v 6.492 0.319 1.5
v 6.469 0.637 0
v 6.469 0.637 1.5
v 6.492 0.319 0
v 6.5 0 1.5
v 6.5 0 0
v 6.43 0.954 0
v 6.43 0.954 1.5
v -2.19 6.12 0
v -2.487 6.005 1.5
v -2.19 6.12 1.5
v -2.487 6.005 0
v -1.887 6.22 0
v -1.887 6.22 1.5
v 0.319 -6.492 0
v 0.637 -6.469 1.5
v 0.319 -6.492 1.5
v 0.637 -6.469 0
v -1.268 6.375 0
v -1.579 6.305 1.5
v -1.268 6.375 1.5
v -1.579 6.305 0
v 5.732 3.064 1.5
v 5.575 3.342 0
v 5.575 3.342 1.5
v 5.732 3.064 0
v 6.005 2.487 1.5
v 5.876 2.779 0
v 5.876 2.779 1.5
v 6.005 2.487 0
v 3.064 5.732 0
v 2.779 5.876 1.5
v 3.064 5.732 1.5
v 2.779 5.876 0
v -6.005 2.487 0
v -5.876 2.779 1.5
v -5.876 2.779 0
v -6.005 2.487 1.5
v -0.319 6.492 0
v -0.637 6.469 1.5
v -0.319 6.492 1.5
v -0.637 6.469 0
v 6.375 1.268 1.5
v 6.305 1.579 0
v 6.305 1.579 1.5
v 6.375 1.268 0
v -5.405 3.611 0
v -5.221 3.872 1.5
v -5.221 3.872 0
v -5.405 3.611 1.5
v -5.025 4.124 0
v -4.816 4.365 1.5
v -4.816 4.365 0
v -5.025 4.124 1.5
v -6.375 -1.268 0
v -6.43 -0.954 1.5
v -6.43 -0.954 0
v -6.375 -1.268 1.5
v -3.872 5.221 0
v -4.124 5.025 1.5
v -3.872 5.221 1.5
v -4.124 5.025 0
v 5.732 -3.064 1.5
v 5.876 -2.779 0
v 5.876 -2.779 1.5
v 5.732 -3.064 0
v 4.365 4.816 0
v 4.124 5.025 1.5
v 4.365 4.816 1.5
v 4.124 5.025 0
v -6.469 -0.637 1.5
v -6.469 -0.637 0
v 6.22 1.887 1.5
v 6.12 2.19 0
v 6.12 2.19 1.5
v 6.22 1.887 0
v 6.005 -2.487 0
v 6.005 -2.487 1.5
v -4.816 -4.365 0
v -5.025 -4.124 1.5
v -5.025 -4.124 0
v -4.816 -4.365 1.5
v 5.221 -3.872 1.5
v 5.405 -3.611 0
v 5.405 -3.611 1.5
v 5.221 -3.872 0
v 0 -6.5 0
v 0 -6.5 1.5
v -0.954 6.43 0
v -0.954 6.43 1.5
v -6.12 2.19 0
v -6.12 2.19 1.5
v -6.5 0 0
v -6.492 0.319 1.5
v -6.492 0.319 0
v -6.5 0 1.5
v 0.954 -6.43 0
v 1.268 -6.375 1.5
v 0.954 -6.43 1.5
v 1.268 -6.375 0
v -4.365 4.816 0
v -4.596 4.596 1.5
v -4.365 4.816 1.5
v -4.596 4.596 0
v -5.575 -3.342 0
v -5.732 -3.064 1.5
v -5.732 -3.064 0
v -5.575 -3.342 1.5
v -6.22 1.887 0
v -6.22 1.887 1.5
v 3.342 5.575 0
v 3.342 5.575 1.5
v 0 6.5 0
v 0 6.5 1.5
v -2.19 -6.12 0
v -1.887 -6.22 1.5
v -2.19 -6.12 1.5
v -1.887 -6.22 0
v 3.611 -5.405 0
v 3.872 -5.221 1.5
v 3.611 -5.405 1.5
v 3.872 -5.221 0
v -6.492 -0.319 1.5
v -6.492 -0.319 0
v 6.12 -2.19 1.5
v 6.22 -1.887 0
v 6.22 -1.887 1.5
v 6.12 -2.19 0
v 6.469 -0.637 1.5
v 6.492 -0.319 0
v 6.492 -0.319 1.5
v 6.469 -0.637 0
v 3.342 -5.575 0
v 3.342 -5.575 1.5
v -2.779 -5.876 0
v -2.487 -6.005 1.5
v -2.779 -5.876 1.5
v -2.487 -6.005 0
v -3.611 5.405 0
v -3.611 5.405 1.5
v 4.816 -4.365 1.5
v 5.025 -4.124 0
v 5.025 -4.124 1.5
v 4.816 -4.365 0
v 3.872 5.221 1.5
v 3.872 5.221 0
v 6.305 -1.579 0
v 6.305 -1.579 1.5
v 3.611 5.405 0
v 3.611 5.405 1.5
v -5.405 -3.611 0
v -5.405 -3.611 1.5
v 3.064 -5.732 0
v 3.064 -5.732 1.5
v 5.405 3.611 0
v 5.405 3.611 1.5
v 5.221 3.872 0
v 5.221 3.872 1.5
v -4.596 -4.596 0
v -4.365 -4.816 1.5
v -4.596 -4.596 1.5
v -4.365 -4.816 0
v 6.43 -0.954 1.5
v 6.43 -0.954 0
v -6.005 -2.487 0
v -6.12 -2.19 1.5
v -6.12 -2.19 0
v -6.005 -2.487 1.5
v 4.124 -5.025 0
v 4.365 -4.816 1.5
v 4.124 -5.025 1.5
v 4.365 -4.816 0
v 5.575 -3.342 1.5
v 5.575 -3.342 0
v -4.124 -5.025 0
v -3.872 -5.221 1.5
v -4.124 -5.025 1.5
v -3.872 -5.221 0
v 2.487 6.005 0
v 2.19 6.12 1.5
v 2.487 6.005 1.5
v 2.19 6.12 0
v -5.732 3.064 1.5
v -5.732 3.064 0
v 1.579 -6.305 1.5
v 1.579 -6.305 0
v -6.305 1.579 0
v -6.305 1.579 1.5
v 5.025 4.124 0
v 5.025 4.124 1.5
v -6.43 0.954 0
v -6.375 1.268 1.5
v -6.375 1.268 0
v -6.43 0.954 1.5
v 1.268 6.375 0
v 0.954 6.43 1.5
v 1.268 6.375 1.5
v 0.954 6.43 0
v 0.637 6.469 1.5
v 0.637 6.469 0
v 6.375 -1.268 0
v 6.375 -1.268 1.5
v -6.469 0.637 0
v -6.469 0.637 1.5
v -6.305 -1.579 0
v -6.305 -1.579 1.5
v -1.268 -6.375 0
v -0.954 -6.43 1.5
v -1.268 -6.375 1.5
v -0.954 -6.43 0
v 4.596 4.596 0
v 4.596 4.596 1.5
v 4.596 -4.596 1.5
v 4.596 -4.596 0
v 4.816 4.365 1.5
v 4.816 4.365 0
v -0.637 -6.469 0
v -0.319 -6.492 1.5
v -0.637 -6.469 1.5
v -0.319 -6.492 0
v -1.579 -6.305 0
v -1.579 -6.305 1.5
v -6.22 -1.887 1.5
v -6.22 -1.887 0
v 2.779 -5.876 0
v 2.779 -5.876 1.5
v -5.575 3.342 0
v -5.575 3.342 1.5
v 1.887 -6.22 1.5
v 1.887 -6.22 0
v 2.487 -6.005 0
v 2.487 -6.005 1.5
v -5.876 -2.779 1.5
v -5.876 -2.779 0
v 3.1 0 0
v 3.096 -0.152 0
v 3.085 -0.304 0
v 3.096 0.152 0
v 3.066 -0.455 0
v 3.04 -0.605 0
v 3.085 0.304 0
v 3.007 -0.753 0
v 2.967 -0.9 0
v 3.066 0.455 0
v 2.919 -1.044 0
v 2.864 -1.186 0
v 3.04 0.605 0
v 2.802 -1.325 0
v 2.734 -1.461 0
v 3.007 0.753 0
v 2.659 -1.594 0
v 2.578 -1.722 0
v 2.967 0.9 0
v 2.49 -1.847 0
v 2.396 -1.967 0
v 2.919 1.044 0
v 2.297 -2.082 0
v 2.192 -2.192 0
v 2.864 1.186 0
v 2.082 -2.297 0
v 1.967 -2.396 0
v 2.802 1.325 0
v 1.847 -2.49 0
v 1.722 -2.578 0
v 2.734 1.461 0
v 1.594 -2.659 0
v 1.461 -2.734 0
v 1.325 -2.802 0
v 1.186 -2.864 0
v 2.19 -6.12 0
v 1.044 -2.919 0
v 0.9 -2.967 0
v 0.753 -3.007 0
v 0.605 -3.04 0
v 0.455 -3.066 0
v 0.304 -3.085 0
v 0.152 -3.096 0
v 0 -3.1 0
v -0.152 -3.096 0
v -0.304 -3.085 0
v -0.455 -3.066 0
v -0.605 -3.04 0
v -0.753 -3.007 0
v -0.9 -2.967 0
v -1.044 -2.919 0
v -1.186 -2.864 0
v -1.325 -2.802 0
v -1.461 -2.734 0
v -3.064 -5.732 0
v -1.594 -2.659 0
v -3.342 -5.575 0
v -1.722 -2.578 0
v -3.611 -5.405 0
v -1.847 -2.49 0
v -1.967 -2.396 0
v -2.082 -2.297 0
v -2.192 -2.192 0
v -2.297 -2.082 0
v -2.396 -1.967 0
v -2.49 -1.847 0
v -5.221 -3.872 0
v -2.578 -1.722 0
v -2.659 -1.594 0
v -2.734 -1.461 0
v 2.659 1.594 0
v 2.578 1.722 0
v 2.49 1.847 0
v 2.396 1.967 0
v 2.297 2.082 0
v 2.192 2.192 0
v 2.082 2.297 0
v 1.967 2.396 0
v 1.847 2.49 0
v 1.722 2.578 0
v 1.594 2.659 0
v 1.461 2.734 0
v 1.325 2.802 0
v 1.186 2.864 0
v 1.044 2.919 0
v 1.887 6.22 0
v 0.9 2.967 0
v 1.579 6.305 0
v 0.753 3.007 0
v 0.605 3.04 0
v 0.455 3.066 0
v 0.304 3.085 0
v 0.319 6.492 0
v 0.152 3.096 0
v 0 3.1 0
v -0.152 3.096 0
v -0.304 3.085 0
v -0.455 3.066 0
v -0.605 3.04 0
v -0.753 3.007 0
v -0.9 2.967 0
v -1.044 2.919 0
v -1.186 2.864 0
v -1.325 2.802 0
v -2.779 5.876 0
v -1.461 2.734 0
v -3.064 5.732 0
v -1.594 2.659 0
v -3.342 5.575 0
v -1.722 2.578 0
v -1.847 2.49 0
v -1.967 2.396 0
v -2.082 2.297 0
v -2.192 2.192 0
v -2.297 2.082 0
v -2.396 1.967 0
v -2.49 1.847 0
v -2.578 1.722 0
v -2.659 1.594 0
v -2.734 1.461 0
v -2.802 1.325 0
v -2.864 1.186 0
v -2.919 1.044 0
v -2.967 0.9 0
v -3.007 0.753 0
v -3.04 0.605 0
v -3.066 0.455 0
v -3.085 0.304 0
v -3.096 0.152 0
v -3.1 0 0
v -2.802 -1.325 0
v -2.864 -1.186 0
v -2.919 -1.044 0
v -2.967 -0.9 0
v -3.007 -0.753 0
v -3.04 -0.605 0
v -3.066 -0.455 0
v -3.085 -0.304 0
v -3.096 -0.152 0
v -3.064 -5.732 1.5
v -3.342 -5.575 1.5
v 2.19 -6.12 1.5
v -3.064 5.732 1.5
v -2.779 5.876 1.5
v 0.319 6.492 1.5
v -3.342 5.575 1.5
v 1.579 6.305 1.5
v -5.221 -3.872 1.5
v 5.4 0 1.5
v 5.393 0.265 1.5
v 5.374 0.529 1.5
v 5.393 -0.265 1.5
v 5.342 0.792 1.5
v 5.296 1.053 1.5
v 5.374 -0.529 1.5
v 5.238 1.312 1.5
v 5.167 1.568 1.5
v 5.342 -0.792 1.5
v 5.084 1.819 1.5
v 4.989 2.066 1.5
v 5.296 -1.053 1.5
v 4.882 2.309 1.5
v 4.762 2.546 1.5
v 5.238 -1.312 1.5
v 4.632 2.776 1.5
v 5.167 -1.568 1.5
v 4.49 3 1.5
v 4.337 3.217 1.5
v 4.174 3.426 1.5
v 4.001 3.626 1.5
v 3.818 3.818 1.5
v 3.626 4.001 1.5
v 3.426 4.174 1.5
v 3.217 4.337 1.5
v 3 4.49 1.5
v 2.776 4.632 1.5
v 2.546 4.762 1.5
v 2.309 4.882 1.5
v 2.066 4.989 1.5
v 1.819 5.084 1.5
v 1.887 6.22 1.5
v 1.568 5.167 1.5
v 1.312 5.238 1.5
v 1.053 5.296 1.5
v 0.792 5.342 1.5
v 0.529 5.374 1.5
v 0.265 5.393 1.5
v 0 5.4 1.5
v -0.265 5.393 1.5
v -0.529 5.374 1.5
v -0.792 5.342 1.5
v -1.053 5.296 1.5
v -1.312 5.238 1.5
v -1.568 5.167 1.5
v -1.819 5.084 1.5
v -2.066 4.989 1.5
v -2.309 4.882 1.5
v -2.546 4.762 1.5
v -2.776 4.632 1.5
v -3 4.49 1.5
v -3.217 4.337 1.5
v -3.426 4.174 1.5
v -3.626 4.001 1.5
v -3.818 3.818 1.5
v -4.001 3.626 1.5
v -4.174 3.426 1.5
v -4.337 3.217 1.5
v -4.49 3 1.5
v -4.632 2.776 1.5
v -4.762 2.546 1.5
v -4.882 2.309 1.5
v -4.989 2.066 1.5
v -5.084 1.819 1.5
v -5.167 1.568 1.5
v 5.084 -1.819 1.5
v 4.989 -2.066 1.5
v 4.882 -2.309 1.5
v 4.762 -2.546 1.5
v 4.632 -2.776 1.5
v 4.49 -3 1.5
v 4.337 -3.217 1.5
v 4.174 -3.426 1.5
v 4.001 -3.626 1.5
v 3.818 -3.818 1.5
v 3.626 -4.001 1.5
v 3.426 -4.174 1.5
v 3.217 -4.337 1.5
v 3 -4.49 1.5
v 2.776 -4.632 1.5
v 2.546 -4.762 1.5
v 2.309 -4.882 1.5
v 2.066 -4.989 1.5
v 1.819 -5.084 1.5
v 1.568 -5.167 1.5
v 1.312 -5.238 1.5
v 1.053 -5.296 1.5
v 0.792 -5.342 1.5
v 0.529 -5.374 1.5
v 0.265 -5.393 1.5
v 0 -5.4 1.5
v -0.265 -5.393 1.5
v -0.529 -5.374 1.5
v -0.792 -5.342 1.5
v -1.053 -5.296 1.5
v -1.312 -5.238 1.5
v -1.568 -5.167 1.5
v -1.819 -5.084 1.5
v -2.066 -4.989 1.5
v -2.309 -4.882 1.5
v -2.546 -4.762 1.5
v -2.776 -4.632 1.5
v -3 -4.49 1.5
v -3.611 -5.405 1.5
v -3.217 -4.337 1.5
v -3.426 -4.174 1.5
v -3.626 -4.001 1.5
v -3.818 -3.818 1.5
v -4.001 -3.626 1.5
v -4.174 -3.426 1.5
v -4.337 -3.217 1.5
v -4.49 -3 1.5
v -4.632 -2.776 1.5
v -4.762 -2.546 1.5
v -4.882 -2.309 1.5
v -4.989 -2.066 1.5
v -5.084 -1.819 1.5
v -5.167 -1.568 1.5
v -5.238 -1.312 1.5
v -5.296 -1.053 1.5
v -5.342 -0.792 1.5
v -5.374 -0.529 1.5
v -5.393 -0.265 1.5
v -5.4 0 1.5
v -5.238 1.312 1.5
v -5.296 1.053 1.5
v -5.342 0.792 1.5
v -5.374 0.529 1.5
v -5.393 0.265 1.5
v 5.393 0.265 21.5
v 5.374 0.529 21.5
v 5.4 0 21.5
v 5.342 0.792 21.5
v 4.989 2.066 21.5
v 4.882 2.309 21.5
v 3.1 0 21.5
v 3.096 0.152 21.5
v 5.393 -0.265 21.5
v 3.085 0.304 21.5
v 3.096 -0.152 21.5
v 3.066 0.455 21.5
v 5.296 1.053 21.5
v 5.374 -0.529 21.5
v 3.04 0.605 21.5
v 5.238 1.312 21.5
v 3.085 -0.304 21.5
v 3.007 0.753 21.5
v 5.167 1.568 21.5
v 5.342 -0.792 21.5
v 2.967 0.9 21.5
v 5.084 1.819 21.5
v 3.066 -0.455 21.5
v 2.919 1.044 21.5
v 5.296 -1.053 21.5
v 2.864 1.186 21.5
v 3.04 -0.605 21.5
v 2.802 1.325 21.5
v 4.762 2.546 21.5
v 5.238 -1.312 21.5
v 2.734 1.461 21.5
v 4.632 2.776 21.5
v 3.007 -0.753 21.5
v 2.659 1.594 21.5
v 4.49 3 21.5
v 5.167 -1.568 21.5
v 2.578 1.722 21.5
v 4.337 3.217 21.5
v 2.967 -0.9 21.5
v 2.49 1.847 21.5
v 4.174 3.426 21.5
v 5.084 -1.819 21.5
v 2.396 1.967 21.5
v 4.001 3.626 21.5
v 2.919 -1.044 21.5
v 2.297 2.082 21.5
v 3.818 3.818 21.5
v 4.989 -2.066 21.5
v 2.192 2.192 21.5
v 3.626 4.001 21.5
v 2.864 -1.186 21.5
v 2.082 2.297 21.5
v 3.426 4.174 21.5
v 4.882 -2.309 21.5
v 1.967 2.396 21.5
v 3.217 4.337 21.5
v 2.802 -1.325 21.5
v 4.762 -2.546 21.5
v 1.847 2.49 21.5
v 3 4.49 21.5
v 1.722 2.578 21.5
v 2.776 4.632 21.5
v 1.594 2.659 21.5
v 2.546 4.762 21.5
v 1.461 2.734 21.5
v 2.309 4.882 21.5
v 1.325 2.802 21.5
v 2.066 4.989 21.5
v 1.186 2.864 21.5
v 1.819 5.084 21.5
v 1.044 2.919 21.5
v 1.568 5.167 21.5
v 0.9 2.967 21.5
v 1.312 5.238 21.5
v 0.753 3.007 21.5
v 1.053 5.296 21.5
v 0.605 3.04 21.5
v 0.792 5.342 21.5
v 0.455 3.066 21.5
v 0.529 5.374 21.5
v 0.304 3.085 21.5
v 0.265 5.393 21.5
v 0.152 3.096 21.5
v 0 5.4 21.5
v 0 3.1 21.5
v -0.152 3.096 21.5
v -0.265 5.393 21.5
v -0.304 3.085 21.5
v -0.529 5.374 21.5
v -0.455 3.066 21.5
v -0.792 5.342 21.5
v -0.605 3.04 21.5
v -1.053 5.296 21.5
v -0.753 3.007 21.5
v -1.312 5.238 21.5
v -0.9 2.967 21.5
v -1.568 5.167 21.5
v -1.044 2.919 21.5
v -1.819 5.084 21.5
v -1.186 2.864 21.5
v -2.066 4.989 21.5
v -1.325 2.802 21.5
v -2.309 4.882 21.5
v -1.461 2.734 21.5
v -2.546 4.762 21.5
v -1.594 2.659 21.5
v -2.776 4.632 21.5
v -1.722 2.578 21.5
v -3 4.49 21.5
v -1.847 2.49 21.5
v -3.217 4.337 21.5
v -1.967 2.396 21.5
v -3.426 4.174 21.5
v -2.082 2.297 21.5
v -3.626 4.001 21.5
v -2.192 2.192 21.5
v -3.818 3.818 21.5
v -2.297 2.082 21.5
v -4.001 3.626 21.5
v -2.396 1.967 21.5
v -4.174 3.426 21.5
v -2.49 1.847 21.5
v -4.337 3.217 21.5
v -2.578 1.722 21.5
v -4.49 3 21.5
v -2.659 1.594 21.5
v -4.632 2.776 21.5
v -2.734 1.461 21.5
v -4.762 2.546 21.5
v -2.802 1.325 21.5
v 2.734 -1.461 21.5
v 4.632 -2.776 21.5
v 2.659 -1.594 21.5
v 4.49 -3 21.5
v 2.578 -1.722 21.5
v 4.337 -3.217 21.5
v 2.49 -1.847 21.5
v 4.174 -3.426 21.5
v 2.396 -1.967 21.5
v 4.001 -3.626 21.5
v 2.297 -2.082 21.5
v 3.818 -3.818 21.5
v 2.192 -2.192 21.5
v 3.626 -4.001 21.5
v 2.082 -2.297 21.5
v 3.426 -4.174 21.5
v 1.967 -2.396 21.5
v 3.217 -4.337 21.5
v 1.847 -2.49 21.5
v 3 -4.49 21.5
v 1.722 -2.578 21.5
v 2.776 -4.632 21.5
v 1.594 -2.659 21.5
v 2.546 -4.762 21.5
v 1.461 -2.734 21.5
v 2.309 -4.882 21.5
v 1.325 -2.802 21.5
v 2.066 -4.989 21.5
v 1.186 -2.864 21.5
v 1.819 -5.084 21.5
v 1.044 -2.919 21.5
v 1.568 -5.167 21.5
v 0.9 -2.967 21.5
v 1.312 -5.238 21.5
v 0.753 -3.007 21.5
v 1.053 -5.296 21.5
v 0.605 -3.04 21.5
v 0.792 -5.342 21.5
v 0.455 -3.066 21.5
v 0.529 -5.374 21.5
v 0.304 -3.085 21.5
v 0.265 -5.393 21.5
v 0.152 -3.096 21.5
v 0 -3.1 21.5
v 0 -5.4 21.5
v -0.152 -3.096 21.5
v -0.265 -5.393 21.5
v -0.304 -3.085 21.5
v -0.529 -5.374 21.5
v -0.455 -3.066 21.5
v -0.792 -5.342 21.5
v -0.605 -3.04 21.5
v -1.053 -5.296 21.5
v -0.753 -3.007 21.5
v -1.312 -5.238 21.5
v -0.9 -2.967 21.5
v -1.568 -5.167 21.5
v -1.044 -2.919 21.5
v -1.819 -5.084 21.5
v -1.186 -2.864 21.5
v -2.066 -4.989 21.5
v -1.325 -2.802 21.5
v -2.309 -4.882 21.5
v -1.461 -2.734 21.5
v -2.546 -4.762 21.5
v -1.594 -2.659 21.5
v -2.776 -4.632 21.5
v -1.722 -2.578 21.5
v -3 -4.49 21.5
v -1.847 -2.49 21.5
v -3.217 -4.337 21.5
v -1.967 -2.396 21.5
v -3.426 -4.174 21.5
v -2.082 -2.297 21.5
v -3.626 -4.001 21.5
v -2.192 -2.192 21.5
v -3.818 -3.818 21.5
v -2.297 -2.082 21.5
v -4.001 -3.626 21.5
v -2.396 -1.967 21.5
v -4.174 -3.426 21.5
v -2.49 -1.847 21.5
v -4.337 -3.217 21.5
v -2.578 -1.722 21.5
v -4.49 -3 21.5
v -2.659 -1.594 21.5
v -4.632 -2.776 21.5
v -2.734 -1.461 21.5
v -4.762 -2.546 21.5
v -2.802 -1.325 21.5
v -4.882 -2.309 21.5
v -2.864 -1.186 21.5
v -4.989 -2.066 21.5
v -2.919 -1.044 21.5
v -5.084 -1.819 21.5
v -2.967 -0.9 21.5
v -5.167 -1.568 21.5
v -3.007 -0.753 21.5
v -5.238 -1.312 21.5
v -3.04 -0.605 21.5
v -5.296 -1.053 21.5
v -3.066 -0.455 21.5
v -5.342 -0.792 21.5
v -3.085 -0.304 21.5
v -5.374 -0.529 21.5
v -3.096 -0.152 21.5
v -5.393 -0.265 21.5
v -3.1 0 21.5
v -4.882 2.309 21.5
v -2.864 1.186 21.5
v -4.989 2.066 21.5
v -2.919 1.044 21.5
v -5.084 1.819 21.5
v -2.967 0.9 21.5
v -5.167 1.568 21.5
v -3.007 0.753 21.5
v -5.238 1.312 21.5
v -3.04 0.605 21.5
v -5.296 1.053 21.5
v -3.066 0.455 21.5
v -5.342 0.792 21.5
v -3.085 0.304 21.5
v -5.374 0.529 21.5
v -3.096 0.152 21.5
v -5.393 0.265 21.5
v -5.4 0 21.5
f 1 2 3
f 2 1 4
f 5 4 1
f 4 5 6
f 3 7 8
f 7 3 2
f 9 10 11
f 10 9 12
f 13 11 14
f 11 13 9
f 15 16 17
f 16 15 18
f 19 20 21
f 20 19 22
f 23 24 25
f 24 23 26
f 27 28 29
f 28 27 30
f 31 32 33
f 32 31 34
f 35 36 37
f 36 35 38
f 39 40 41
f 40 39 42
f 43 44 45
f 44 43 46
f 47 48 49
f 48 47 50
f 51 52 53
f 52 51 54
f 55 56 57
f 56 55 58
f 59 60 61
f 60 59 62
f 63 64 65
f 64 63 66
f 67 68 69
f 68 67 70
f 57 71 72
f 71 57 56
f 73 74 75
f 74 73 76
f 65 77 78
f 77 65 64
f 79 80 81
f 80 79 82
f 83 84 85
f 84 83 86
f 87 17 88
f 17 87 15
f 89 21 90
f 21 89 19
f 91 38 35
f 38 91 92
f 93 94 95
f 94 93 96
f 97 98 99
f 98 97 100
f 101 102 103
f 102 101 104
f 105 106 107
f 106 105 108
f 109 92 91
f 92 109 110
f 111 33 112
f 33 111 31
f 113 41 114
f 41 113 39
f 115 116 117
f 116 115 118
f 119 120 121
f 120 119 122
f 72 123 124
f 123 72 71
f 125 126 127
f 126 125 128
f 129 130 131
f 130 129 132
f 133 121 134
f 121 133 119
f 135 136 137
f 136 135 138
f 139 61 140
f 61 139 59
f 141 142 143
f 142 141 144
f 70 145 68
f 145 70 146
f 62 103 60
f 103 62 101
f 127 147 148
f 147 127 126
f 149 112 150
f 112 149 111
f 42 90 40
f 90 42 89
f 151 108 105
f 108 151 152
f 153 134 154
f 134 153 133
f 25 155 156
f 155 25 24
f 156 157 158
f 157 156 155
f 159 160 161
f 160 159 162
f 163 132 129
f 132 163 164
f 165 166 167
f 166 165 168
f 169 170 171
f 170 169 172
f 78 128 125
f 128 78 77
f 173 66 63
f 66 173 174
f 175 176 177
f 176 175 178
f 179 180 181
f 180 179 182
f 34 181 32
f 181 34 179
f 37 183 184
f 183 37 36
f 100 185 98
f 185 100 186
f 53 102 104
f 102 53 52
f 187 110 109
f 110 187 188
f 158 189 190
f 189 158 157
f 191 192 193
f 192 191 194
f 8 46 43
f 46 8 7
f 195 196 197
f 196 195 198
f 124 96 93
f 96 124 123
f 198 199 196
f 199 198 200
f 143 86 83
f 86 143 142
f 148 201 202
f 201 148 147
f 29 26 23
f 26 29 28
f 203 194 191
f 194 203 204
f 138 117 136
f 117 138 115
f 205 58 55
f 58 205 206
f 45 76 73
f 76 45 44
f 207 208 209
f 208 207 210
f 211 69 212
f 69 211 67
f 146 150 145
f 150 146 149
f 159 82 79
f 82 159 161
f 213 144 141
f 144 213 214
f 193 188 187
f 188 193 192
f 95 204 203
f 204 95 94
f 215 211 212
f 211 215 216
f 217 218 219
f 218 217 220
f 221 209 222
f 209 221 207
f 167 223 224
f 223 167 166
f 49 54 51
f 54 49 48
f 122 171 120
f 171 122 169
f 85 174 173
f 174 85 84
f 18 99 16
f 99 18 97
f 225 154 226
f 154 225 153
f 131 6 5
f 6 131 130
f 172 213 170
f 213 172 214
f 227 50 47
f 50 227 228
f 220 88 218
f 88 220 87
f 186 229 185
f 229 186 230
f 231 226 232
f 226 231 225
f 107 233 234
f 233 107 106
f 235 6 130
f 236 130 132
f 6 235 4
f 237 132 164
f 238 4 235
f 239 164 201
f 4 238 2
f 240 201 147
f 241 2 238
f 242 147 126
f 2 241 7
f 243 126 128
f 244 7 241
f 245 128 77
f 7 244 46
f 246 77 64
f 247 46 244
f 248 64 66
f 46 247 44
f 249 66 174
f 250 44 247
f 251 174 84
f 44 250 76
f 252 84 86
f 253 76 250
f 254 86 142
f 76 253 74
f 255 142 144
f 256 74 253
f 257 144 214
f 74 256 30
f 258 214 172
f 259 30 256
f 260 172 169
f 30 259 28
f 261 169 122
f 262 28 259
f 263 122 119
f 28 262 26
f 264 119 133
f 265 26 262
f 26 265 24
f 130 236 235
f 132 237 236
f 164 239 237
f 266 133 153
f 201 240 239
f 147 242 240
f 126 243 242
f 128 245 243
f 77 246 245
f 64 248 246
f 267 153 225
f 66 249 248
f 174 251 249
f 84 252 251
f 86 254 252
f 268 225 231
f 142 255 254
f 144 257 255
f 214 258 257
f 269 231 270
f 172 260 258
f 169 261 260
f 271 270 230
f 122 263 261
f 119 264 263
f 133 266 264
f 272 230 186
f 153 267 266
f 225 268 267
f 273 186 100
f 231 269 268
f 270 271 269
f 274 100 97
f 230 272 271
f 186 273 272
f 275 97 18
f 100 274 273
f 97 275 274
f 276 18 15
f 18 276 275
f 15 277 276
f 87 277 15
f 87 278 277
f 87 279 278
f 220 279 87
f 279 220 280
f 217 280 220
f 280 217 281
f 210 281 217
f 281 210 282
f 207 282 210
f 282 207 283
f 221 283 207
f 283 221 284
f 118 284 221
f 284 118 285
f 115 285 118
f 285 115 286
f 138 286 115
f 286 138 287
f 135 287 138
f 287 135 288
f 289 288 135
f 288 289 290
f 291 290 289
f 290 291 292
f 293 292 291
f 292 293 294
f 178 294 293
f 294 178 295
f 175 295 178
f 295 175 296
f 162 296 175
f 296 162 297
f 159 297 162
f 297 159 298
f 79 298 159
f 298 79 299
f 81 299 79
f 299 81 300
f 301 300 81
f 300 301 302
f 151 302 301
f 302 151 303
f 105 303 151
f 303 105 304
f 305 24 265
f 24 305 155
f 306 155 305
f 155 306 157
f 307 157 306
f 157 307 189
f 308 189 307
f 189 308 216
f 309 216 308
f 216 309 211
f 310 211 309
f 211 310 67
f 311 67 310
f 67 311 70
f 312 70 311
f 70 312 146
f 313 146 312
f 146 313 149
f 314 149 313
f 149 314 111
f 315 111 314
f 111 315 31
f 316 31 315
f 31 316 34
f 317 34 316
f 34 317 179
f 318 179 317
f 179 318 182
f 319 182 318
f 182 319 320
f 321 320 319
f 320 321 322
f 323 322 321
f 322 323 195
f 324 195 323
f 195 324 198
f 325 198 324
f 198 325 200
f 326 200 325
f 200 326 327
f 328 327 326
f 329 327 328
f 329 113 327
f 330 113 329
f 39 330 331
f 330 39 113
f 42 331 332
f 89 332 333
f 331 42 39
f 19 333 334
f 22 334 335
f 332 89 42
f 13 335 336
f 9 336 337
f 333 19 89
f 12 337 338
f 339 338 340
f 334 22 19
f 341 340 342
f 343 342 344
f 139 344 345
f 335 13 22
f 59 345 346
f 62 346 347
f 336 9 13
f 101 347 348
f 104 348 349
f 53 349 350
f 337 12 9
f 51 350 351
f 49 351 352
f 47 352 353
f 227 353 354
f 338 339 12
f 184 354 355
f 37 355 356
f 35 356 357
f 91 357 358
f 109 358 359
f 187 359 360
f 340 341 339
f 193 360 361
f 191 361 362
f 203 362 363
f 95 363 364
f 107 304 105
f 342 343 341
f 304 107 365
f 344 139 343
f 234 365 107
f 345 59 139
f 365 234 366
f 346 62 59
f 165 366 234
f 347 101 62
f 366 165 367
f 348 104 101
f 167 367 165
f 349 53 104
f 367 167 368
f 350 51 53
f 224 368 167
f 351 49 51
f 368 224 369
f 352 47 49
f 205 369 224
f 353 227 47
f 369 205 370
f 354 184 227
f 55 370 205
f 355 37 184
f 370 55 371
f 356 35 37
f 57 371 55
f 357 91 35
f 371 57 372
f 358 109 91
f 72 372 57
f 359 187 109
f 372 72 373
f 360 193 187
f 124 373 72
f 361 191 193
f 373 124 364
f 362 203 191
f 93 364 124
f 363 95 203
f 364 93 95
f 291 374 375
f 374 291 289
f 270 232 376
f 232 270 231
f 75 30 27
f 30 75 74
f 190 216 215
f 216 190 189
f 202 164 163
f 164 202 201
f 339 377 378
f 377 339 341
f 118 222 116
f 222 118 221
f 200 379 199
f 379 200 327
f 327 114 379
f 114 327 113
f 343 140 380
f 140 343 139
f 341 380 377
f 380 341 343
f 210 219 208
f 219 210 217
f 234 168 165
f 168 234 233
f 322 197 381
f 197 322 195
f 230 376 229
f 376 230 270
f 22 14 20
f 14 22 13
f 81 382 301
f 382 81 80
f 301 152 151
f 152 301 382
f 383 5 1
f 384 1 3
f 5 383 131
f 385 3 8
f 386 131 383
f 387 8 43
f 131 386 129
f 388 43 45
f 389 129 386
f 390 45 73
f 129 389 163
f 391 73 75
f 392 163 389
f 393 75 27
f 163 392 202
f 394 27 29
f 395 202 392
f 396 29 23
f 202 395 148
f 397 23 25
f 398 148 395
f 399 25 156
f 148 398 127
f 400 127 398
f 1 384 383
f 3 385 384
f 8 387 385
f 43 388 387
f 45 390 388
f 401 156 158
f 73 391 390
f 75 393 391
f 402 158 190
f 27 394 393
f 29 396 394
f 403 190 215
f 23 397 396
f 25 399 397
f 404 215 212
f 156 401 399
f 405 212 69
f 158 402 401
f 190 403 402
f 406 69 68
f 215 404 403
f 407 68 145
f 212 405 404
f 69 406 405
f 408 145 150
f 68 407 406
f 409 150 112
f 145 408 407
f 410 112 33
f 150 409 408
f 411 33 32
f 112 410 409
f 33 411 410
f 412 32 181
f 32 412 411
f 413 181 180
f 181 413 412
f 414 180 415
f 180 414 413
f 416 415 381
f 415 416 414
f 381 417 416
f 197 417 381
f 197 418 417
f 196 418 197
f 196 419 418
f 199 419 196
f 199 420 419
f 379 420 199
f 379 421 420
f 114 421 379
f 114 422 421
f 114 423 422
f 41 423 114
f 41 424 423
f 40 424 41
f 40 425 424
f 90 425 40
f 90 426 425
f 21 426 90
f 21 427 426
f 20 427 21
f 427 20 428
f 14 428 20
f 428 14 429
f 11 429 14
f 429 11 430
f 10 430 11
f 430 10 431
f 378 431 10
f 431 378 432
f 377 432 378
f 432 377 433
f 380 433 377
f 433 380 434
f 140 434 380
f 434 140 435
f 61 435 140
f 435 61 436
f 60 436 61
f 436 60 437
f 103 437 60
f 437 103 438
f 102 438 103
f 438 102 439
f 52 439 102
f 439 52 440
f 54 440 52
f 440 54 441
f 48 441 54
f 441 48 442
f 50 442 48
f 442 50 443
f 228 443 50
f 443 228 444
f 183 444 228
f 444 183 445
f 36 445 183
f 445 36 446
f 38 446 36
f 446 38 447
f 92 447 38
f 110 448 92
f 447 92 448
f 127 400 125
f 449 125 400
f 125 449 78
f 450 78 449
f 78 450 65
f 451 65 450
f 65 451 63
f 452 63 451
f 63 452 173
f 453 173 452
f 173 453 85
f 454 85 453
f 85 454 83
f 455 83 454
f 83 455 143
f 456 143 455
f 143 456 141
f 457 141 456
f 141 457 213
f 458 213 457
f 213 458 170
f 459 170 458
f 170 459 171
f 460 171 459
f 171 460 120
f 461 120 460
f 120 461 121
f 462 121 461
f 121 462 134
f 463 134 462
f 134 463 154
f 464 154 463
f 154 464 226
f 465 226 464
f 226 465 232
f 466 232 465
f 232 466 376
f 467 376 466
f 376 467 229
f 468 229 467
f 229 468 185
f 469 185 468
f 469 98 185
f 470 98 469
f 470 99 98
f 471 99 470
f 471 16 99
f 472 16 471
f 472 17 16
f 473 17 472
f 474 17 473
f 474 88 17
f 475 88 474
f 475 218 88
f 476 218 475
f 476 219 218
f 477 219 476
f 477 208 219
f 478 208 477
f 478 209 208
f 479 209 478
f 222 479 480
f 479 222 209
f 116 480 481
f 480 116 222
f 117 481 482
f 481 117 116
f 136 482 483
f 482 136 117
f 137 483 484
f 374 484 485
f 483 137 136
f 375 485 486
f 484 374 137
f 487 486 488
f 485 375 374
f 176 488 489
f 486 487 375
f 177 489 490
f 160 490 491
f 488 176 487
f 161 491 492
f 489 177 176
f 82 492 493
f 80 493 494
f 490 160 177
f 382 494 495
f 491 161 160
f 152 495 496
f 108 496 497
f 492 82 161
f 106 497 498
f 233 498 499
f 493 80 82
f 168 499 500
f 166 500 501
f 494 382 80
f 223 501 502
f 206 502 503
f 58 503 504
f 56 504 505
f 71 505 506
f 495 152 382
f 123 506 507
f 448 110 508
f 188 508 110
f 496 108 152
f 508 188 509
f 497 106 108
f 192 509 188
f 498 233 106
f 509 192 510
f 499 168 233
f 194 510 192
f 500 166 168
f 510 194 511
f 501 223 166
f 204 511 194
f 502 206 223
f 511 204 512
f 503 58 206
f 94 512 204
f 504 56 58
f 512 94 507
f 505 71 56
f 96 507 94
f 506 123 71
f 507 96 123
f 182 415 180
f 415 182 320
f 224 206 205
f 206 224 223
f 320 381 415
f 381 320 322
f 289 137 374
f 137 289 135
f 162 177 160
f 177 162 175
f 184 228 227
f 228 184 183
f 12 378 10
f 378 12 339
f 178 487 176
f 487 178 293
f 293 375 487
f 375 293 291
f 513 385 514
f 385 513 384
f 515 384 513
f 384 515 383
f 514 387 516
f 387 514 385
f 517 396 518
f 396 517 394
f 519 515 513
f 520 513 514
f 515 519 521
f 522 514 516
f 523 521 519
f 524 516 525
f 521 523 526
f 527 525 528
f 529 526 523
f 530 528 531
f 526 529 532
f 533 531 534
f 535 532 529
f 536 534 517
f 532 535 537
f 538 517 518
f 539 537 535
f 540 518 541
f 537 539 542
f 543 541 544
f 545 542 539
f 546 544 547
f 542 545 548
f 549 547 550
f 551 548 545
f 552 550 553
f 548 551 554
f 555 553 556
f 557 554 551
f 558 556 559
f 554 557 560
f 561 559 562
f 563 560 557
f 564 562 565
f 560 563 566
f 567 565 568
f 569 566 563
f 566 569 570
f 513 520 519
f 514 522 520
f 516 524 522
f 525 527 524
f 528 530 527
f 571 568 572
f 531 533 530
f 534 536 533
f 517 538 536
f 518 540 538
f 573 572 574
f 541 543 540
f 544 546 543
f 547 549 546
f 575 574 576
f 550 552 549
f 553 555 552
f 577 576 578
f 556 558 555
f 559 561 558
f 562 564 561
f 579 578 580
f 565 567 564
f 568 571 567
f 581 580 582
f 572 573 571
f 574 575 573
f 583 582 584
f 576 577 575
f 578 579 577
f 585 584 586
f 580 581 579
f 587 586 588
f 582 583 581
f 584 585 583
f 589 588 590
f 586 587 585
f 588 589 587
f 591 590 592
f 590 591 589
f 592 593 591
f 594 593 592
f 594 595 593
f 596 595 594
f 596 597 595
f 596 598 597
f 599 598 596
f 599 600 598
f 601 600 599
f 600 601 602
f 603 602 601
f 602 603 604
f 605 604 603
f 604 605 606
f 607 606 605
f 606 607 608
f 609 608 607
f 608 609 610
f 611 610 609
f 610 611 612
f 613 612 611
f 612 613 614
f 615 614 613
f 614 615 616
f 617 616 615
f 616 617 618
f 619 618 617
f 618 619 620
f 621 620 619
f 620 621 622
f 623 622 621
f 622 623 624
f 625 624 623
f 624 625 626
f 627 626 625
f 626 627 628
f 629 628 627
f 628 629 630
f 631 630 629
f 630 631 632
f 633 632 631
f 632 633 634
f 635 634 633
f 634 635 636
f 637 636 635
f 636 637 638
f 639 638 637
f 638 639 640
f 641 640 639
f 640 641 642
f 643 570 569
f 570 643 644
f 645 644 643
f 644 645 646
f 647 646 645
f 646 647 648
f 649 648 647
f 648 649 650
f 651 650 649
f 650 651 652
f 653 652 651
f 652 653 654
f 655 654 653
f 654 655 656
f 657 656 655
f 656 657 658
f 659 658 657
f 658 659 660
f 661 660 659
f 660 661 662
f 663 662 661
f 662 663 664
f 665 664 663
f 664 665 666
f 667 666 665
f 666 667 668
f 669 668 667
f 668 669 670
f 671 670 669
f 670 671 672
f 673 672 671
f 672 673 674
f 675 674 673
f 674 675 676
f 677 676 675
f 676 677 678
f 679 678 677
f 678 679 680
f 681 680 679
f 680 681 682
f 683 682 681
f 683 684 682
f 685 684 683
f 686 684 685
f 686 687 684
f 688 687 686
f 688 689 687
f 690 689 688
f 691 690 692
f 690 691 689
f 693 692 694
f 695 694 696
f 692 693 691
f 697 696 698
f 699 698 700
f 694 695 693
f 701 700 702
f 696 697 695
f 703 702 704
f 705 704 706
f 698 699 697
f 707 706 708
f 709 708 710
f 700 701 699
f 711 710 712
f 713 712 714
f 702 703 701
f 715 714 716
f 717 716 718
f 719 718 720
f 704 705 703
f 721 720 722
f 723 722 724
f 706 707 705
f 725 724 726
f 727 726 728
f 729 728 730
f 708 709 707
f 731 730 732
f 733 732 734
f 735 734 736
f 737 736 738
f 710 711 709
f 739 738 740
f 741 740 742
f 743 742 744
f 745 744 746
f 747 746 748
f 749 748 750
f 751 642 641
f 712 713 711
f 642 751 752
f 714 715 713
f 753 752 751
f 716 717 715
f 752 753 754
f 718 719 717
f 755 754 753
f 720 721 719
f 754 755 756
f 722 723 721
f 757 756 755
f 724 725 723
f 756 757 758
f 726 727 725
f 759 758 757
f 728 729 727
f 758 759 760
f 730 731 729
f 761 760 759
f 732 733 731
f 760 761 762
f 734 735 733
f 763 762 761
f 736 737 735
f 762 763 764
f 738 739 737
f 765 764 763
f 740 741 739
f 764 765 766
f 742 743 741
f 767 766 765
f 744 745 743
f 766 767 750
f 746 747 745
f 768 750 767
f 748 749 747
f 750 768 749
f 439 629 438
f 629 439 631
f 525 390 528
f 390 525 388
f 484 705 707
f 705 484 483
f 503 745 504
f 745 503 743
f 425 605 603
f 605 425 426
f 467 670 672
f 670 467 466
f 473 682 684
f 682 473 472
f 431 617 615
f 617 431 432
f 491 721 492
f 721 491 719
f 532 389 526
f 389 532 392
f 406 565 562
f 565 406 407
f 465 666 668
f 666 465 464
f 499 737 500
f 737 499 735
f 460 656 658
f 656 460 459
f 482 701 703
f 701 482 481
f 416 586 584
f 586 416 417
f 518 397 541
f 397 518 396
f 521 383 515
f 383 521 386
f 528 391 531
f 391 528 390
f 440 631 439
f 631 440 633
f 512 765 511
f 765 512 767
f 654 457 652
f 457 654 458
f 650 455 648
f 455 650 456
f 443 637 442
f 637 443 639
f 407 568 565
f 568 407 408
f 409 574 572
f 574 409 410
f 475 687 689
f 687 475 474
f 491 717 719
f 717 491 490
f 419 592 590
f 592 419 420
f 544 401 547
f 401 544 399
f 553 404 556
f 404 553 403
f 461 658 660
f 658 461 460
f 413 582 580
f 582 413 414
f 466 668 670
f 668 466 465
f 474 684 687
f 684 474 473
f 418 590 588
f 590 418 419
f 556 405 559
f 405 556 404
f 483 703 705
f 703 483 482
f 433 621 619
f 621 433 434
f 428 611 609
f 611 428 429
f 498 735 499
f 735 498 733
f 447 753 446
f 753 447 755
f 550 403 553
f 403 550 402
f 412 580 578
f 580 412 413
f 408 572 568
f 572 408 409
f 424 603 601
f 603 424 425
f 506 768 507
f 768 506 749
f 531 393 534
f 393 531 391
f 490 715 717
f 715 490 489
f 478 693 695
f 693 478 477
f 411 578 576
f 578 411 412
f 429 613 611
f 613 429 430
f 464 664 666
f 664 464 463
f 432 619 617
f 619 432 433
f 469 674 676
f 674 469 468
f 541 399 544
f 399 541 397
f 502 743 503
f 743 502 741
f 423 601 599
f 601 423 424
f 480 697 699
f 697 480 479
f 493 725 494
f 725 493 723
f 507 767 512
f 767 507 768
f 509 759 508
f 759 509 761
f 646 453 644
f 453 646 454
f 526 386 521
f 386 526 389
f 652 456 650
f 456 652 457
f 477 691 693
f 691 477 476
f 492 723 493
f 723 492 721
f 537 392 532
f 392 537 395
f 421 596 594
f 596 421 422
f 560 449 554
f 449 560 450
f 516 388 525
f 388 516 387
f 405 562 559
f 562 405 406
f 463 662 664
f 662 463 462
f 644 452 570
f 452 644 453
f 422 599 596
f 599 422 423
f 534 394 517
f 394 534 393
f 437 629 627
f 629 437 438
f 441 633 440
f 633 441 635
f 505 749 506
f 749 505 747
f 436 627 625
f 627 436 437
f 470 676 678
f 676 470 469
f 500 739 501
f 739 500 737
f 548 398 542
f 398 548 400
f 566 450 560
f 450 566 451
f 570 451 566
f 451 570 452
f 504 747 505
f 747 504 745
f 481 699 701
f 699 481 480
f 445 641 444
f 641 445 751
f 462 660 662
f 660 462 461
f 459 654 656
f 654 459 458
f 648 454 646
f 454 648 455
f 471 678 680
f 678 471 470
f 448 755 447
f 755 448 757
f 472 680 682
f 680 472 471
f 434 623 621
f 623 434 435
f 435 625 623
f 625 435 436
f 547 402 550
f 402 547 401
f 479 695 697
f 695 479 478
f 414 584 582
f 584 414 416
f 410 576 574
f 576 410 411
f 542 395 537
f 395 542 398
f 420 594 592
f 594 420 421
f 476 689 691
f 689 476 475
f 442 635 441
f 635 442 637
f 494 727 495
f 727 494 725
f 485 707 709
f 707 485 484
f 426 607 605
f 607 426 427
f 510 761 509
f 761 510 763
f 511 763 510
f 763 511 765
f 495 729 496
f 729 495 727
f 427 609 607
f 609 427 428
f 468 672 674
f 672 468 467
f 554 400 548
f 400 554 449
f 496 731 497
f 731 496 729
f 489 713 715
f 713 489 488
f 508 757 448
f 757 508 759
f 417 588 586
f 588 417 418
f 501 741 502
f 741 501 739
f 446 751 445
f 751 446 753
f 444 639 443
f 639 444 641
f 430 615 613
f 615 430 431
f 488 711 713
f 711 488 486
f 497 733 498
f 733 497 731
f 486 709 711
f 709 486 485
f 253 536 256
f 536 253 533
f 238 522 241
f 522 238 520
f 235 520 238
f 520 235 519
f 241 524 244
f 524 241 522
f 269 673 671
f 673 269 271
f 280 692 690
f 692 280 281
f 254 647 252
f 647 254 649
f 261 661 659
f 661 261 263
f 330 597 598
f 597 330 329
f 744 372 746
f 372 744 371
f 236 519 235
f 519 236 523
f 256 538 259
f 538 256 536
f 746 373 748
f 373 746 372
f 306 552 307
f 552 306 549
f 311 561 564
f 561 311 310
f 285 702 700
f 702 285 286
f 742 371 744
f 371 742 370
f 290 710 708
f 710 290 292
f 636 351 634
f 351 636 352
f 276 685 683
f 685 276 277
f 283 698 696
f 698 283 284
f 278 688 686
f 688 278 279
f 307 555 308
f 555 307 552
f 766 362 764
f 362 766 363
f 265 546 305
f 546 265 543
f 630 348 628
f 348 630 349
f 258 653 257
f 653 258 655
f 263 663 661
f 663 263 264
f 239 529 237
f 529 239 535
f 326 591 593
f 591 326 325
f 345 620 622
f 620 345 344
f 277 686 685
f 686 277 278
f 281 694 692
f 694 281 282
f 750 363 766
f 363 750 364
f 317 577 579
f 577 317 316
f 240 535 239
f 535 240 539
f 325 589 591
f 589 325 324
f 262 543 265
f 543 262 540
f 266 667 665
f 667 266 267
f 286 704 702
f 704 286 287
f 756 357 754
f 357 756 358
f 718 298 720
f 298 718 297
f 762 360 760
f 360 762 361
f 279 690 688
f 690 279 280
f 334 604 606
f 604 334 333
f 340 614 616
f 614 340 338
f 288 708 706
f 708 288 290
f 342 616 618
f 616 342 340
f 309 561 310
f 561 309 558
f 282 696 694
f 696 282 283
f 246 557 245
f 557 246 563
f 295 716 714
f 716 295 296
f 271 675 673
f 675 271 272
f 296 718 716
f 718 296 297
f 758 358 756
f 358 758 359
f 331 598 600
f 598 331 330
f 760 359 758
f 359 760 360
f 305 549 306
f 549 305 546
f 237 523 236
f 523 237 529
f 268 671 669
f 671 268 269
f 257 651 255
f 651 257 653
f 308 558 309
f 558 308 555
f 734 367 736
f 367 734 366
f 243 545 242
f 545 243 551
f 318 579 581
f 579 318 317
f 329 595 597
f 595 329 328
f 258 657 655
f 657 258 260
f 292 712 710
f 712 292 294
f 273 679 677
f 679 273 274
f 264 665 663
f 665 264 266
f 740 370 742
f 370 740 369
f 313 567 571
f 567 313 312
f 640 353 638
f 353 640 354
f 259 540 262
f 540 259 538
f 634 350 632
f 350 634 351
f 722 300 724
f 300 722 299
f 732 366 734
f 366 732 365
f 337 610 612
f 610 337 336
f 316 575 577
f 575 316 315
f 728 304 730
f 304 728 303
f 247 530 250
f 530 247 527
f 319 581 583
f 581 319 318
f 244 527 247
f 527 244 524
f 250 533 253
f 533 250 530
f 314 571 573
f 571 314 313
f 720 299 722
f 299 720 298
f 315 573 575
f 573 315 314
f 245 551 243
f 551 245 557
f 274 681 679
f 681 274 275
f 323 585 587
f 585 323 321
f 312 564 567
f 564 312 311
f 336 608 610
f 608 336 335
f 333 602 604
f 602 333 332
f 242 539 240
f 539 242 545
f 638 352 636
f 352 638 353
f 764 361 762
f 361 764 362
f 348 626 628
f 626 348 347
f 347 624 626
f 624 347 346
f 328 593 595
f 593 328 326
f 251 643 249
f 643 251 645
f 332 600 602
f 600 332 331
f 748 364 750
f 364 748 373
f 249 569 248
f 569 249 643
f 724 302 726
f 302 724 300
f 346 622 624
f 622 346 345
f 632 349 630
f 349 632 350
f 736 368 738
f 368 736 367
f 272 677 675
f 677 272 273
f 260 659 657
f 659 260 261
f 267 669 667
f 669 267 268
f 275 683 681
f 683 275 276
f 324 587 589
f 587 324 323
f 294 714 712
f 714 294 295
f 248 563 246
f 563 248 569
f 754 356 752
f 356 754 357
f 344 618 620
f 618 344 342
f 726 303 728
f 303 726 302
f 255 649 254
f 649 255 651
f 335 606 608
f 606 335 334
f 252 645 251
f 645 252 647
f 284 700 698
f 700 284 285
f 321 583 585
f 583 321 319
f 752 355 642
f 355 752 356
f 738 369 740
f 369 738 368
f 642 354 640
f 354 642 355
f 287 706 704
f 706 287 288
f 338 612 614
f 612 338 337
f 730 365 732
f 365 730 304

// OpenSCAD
// Adapter Sleeve for 0.2mL PCR tube in 1.5mL rack
// Print orientation: Upside down (Collar on bed)
// Units: mm

// --- Dimensions ---
$fn = 128; // High resolution for smooth curves

// Collar (Base)
$collar_diameter = 13.0;
$collar_thickness = 1.5;

// Sleeve Body
$sleeve_outer_diameter = 10.8;
$sleeve_total_height = 21.5;

// Bore
$bore_diameter = 6.2;

// --- Calculations ---
$collar_radius = $collar_diameter / 2;
$sleeve_outer_radius = $sleeve_outer_diameter / 2;
$sleeve_inner_radius = $bore_diameter / 2;
$sleeve_body_height = $sleeve_total_height - $collar_thickness;

// --- Main Block ---
difference() {
    // 1. The Outer Shape (Union of Collar and Sleeve Body)
    union() {
        // Collar (Lies on Z=0)
        cylinder(
            h = $collar_thickness,
            d1 = $collar_diameter,
            d2 = $collar_diameter,
            center = false
        );

        // Sleeve Body (Rises from Z=1.5 to Z=21.5)
        translate([0, 0, $collar_thickness]) {
            cylinder(
                h = $sleeve_body_height,
                d1 = $sleeve_outer_diameter,
                d2 = $sleeve_outer_diameter,
                center = false
            );
        }
    }

    // 2. The Bore Hole (Runs through full height)
    // Extends slightly past the top and bottom to ensure clean cut
    translate([0, 0, -0.1]) {
        cylinder(
            h = $sleeve_total_height + 0.2,
            d1 = $bore_diameter,
            d2 = $bore_diameter,
            center = false
        );
    }
}
